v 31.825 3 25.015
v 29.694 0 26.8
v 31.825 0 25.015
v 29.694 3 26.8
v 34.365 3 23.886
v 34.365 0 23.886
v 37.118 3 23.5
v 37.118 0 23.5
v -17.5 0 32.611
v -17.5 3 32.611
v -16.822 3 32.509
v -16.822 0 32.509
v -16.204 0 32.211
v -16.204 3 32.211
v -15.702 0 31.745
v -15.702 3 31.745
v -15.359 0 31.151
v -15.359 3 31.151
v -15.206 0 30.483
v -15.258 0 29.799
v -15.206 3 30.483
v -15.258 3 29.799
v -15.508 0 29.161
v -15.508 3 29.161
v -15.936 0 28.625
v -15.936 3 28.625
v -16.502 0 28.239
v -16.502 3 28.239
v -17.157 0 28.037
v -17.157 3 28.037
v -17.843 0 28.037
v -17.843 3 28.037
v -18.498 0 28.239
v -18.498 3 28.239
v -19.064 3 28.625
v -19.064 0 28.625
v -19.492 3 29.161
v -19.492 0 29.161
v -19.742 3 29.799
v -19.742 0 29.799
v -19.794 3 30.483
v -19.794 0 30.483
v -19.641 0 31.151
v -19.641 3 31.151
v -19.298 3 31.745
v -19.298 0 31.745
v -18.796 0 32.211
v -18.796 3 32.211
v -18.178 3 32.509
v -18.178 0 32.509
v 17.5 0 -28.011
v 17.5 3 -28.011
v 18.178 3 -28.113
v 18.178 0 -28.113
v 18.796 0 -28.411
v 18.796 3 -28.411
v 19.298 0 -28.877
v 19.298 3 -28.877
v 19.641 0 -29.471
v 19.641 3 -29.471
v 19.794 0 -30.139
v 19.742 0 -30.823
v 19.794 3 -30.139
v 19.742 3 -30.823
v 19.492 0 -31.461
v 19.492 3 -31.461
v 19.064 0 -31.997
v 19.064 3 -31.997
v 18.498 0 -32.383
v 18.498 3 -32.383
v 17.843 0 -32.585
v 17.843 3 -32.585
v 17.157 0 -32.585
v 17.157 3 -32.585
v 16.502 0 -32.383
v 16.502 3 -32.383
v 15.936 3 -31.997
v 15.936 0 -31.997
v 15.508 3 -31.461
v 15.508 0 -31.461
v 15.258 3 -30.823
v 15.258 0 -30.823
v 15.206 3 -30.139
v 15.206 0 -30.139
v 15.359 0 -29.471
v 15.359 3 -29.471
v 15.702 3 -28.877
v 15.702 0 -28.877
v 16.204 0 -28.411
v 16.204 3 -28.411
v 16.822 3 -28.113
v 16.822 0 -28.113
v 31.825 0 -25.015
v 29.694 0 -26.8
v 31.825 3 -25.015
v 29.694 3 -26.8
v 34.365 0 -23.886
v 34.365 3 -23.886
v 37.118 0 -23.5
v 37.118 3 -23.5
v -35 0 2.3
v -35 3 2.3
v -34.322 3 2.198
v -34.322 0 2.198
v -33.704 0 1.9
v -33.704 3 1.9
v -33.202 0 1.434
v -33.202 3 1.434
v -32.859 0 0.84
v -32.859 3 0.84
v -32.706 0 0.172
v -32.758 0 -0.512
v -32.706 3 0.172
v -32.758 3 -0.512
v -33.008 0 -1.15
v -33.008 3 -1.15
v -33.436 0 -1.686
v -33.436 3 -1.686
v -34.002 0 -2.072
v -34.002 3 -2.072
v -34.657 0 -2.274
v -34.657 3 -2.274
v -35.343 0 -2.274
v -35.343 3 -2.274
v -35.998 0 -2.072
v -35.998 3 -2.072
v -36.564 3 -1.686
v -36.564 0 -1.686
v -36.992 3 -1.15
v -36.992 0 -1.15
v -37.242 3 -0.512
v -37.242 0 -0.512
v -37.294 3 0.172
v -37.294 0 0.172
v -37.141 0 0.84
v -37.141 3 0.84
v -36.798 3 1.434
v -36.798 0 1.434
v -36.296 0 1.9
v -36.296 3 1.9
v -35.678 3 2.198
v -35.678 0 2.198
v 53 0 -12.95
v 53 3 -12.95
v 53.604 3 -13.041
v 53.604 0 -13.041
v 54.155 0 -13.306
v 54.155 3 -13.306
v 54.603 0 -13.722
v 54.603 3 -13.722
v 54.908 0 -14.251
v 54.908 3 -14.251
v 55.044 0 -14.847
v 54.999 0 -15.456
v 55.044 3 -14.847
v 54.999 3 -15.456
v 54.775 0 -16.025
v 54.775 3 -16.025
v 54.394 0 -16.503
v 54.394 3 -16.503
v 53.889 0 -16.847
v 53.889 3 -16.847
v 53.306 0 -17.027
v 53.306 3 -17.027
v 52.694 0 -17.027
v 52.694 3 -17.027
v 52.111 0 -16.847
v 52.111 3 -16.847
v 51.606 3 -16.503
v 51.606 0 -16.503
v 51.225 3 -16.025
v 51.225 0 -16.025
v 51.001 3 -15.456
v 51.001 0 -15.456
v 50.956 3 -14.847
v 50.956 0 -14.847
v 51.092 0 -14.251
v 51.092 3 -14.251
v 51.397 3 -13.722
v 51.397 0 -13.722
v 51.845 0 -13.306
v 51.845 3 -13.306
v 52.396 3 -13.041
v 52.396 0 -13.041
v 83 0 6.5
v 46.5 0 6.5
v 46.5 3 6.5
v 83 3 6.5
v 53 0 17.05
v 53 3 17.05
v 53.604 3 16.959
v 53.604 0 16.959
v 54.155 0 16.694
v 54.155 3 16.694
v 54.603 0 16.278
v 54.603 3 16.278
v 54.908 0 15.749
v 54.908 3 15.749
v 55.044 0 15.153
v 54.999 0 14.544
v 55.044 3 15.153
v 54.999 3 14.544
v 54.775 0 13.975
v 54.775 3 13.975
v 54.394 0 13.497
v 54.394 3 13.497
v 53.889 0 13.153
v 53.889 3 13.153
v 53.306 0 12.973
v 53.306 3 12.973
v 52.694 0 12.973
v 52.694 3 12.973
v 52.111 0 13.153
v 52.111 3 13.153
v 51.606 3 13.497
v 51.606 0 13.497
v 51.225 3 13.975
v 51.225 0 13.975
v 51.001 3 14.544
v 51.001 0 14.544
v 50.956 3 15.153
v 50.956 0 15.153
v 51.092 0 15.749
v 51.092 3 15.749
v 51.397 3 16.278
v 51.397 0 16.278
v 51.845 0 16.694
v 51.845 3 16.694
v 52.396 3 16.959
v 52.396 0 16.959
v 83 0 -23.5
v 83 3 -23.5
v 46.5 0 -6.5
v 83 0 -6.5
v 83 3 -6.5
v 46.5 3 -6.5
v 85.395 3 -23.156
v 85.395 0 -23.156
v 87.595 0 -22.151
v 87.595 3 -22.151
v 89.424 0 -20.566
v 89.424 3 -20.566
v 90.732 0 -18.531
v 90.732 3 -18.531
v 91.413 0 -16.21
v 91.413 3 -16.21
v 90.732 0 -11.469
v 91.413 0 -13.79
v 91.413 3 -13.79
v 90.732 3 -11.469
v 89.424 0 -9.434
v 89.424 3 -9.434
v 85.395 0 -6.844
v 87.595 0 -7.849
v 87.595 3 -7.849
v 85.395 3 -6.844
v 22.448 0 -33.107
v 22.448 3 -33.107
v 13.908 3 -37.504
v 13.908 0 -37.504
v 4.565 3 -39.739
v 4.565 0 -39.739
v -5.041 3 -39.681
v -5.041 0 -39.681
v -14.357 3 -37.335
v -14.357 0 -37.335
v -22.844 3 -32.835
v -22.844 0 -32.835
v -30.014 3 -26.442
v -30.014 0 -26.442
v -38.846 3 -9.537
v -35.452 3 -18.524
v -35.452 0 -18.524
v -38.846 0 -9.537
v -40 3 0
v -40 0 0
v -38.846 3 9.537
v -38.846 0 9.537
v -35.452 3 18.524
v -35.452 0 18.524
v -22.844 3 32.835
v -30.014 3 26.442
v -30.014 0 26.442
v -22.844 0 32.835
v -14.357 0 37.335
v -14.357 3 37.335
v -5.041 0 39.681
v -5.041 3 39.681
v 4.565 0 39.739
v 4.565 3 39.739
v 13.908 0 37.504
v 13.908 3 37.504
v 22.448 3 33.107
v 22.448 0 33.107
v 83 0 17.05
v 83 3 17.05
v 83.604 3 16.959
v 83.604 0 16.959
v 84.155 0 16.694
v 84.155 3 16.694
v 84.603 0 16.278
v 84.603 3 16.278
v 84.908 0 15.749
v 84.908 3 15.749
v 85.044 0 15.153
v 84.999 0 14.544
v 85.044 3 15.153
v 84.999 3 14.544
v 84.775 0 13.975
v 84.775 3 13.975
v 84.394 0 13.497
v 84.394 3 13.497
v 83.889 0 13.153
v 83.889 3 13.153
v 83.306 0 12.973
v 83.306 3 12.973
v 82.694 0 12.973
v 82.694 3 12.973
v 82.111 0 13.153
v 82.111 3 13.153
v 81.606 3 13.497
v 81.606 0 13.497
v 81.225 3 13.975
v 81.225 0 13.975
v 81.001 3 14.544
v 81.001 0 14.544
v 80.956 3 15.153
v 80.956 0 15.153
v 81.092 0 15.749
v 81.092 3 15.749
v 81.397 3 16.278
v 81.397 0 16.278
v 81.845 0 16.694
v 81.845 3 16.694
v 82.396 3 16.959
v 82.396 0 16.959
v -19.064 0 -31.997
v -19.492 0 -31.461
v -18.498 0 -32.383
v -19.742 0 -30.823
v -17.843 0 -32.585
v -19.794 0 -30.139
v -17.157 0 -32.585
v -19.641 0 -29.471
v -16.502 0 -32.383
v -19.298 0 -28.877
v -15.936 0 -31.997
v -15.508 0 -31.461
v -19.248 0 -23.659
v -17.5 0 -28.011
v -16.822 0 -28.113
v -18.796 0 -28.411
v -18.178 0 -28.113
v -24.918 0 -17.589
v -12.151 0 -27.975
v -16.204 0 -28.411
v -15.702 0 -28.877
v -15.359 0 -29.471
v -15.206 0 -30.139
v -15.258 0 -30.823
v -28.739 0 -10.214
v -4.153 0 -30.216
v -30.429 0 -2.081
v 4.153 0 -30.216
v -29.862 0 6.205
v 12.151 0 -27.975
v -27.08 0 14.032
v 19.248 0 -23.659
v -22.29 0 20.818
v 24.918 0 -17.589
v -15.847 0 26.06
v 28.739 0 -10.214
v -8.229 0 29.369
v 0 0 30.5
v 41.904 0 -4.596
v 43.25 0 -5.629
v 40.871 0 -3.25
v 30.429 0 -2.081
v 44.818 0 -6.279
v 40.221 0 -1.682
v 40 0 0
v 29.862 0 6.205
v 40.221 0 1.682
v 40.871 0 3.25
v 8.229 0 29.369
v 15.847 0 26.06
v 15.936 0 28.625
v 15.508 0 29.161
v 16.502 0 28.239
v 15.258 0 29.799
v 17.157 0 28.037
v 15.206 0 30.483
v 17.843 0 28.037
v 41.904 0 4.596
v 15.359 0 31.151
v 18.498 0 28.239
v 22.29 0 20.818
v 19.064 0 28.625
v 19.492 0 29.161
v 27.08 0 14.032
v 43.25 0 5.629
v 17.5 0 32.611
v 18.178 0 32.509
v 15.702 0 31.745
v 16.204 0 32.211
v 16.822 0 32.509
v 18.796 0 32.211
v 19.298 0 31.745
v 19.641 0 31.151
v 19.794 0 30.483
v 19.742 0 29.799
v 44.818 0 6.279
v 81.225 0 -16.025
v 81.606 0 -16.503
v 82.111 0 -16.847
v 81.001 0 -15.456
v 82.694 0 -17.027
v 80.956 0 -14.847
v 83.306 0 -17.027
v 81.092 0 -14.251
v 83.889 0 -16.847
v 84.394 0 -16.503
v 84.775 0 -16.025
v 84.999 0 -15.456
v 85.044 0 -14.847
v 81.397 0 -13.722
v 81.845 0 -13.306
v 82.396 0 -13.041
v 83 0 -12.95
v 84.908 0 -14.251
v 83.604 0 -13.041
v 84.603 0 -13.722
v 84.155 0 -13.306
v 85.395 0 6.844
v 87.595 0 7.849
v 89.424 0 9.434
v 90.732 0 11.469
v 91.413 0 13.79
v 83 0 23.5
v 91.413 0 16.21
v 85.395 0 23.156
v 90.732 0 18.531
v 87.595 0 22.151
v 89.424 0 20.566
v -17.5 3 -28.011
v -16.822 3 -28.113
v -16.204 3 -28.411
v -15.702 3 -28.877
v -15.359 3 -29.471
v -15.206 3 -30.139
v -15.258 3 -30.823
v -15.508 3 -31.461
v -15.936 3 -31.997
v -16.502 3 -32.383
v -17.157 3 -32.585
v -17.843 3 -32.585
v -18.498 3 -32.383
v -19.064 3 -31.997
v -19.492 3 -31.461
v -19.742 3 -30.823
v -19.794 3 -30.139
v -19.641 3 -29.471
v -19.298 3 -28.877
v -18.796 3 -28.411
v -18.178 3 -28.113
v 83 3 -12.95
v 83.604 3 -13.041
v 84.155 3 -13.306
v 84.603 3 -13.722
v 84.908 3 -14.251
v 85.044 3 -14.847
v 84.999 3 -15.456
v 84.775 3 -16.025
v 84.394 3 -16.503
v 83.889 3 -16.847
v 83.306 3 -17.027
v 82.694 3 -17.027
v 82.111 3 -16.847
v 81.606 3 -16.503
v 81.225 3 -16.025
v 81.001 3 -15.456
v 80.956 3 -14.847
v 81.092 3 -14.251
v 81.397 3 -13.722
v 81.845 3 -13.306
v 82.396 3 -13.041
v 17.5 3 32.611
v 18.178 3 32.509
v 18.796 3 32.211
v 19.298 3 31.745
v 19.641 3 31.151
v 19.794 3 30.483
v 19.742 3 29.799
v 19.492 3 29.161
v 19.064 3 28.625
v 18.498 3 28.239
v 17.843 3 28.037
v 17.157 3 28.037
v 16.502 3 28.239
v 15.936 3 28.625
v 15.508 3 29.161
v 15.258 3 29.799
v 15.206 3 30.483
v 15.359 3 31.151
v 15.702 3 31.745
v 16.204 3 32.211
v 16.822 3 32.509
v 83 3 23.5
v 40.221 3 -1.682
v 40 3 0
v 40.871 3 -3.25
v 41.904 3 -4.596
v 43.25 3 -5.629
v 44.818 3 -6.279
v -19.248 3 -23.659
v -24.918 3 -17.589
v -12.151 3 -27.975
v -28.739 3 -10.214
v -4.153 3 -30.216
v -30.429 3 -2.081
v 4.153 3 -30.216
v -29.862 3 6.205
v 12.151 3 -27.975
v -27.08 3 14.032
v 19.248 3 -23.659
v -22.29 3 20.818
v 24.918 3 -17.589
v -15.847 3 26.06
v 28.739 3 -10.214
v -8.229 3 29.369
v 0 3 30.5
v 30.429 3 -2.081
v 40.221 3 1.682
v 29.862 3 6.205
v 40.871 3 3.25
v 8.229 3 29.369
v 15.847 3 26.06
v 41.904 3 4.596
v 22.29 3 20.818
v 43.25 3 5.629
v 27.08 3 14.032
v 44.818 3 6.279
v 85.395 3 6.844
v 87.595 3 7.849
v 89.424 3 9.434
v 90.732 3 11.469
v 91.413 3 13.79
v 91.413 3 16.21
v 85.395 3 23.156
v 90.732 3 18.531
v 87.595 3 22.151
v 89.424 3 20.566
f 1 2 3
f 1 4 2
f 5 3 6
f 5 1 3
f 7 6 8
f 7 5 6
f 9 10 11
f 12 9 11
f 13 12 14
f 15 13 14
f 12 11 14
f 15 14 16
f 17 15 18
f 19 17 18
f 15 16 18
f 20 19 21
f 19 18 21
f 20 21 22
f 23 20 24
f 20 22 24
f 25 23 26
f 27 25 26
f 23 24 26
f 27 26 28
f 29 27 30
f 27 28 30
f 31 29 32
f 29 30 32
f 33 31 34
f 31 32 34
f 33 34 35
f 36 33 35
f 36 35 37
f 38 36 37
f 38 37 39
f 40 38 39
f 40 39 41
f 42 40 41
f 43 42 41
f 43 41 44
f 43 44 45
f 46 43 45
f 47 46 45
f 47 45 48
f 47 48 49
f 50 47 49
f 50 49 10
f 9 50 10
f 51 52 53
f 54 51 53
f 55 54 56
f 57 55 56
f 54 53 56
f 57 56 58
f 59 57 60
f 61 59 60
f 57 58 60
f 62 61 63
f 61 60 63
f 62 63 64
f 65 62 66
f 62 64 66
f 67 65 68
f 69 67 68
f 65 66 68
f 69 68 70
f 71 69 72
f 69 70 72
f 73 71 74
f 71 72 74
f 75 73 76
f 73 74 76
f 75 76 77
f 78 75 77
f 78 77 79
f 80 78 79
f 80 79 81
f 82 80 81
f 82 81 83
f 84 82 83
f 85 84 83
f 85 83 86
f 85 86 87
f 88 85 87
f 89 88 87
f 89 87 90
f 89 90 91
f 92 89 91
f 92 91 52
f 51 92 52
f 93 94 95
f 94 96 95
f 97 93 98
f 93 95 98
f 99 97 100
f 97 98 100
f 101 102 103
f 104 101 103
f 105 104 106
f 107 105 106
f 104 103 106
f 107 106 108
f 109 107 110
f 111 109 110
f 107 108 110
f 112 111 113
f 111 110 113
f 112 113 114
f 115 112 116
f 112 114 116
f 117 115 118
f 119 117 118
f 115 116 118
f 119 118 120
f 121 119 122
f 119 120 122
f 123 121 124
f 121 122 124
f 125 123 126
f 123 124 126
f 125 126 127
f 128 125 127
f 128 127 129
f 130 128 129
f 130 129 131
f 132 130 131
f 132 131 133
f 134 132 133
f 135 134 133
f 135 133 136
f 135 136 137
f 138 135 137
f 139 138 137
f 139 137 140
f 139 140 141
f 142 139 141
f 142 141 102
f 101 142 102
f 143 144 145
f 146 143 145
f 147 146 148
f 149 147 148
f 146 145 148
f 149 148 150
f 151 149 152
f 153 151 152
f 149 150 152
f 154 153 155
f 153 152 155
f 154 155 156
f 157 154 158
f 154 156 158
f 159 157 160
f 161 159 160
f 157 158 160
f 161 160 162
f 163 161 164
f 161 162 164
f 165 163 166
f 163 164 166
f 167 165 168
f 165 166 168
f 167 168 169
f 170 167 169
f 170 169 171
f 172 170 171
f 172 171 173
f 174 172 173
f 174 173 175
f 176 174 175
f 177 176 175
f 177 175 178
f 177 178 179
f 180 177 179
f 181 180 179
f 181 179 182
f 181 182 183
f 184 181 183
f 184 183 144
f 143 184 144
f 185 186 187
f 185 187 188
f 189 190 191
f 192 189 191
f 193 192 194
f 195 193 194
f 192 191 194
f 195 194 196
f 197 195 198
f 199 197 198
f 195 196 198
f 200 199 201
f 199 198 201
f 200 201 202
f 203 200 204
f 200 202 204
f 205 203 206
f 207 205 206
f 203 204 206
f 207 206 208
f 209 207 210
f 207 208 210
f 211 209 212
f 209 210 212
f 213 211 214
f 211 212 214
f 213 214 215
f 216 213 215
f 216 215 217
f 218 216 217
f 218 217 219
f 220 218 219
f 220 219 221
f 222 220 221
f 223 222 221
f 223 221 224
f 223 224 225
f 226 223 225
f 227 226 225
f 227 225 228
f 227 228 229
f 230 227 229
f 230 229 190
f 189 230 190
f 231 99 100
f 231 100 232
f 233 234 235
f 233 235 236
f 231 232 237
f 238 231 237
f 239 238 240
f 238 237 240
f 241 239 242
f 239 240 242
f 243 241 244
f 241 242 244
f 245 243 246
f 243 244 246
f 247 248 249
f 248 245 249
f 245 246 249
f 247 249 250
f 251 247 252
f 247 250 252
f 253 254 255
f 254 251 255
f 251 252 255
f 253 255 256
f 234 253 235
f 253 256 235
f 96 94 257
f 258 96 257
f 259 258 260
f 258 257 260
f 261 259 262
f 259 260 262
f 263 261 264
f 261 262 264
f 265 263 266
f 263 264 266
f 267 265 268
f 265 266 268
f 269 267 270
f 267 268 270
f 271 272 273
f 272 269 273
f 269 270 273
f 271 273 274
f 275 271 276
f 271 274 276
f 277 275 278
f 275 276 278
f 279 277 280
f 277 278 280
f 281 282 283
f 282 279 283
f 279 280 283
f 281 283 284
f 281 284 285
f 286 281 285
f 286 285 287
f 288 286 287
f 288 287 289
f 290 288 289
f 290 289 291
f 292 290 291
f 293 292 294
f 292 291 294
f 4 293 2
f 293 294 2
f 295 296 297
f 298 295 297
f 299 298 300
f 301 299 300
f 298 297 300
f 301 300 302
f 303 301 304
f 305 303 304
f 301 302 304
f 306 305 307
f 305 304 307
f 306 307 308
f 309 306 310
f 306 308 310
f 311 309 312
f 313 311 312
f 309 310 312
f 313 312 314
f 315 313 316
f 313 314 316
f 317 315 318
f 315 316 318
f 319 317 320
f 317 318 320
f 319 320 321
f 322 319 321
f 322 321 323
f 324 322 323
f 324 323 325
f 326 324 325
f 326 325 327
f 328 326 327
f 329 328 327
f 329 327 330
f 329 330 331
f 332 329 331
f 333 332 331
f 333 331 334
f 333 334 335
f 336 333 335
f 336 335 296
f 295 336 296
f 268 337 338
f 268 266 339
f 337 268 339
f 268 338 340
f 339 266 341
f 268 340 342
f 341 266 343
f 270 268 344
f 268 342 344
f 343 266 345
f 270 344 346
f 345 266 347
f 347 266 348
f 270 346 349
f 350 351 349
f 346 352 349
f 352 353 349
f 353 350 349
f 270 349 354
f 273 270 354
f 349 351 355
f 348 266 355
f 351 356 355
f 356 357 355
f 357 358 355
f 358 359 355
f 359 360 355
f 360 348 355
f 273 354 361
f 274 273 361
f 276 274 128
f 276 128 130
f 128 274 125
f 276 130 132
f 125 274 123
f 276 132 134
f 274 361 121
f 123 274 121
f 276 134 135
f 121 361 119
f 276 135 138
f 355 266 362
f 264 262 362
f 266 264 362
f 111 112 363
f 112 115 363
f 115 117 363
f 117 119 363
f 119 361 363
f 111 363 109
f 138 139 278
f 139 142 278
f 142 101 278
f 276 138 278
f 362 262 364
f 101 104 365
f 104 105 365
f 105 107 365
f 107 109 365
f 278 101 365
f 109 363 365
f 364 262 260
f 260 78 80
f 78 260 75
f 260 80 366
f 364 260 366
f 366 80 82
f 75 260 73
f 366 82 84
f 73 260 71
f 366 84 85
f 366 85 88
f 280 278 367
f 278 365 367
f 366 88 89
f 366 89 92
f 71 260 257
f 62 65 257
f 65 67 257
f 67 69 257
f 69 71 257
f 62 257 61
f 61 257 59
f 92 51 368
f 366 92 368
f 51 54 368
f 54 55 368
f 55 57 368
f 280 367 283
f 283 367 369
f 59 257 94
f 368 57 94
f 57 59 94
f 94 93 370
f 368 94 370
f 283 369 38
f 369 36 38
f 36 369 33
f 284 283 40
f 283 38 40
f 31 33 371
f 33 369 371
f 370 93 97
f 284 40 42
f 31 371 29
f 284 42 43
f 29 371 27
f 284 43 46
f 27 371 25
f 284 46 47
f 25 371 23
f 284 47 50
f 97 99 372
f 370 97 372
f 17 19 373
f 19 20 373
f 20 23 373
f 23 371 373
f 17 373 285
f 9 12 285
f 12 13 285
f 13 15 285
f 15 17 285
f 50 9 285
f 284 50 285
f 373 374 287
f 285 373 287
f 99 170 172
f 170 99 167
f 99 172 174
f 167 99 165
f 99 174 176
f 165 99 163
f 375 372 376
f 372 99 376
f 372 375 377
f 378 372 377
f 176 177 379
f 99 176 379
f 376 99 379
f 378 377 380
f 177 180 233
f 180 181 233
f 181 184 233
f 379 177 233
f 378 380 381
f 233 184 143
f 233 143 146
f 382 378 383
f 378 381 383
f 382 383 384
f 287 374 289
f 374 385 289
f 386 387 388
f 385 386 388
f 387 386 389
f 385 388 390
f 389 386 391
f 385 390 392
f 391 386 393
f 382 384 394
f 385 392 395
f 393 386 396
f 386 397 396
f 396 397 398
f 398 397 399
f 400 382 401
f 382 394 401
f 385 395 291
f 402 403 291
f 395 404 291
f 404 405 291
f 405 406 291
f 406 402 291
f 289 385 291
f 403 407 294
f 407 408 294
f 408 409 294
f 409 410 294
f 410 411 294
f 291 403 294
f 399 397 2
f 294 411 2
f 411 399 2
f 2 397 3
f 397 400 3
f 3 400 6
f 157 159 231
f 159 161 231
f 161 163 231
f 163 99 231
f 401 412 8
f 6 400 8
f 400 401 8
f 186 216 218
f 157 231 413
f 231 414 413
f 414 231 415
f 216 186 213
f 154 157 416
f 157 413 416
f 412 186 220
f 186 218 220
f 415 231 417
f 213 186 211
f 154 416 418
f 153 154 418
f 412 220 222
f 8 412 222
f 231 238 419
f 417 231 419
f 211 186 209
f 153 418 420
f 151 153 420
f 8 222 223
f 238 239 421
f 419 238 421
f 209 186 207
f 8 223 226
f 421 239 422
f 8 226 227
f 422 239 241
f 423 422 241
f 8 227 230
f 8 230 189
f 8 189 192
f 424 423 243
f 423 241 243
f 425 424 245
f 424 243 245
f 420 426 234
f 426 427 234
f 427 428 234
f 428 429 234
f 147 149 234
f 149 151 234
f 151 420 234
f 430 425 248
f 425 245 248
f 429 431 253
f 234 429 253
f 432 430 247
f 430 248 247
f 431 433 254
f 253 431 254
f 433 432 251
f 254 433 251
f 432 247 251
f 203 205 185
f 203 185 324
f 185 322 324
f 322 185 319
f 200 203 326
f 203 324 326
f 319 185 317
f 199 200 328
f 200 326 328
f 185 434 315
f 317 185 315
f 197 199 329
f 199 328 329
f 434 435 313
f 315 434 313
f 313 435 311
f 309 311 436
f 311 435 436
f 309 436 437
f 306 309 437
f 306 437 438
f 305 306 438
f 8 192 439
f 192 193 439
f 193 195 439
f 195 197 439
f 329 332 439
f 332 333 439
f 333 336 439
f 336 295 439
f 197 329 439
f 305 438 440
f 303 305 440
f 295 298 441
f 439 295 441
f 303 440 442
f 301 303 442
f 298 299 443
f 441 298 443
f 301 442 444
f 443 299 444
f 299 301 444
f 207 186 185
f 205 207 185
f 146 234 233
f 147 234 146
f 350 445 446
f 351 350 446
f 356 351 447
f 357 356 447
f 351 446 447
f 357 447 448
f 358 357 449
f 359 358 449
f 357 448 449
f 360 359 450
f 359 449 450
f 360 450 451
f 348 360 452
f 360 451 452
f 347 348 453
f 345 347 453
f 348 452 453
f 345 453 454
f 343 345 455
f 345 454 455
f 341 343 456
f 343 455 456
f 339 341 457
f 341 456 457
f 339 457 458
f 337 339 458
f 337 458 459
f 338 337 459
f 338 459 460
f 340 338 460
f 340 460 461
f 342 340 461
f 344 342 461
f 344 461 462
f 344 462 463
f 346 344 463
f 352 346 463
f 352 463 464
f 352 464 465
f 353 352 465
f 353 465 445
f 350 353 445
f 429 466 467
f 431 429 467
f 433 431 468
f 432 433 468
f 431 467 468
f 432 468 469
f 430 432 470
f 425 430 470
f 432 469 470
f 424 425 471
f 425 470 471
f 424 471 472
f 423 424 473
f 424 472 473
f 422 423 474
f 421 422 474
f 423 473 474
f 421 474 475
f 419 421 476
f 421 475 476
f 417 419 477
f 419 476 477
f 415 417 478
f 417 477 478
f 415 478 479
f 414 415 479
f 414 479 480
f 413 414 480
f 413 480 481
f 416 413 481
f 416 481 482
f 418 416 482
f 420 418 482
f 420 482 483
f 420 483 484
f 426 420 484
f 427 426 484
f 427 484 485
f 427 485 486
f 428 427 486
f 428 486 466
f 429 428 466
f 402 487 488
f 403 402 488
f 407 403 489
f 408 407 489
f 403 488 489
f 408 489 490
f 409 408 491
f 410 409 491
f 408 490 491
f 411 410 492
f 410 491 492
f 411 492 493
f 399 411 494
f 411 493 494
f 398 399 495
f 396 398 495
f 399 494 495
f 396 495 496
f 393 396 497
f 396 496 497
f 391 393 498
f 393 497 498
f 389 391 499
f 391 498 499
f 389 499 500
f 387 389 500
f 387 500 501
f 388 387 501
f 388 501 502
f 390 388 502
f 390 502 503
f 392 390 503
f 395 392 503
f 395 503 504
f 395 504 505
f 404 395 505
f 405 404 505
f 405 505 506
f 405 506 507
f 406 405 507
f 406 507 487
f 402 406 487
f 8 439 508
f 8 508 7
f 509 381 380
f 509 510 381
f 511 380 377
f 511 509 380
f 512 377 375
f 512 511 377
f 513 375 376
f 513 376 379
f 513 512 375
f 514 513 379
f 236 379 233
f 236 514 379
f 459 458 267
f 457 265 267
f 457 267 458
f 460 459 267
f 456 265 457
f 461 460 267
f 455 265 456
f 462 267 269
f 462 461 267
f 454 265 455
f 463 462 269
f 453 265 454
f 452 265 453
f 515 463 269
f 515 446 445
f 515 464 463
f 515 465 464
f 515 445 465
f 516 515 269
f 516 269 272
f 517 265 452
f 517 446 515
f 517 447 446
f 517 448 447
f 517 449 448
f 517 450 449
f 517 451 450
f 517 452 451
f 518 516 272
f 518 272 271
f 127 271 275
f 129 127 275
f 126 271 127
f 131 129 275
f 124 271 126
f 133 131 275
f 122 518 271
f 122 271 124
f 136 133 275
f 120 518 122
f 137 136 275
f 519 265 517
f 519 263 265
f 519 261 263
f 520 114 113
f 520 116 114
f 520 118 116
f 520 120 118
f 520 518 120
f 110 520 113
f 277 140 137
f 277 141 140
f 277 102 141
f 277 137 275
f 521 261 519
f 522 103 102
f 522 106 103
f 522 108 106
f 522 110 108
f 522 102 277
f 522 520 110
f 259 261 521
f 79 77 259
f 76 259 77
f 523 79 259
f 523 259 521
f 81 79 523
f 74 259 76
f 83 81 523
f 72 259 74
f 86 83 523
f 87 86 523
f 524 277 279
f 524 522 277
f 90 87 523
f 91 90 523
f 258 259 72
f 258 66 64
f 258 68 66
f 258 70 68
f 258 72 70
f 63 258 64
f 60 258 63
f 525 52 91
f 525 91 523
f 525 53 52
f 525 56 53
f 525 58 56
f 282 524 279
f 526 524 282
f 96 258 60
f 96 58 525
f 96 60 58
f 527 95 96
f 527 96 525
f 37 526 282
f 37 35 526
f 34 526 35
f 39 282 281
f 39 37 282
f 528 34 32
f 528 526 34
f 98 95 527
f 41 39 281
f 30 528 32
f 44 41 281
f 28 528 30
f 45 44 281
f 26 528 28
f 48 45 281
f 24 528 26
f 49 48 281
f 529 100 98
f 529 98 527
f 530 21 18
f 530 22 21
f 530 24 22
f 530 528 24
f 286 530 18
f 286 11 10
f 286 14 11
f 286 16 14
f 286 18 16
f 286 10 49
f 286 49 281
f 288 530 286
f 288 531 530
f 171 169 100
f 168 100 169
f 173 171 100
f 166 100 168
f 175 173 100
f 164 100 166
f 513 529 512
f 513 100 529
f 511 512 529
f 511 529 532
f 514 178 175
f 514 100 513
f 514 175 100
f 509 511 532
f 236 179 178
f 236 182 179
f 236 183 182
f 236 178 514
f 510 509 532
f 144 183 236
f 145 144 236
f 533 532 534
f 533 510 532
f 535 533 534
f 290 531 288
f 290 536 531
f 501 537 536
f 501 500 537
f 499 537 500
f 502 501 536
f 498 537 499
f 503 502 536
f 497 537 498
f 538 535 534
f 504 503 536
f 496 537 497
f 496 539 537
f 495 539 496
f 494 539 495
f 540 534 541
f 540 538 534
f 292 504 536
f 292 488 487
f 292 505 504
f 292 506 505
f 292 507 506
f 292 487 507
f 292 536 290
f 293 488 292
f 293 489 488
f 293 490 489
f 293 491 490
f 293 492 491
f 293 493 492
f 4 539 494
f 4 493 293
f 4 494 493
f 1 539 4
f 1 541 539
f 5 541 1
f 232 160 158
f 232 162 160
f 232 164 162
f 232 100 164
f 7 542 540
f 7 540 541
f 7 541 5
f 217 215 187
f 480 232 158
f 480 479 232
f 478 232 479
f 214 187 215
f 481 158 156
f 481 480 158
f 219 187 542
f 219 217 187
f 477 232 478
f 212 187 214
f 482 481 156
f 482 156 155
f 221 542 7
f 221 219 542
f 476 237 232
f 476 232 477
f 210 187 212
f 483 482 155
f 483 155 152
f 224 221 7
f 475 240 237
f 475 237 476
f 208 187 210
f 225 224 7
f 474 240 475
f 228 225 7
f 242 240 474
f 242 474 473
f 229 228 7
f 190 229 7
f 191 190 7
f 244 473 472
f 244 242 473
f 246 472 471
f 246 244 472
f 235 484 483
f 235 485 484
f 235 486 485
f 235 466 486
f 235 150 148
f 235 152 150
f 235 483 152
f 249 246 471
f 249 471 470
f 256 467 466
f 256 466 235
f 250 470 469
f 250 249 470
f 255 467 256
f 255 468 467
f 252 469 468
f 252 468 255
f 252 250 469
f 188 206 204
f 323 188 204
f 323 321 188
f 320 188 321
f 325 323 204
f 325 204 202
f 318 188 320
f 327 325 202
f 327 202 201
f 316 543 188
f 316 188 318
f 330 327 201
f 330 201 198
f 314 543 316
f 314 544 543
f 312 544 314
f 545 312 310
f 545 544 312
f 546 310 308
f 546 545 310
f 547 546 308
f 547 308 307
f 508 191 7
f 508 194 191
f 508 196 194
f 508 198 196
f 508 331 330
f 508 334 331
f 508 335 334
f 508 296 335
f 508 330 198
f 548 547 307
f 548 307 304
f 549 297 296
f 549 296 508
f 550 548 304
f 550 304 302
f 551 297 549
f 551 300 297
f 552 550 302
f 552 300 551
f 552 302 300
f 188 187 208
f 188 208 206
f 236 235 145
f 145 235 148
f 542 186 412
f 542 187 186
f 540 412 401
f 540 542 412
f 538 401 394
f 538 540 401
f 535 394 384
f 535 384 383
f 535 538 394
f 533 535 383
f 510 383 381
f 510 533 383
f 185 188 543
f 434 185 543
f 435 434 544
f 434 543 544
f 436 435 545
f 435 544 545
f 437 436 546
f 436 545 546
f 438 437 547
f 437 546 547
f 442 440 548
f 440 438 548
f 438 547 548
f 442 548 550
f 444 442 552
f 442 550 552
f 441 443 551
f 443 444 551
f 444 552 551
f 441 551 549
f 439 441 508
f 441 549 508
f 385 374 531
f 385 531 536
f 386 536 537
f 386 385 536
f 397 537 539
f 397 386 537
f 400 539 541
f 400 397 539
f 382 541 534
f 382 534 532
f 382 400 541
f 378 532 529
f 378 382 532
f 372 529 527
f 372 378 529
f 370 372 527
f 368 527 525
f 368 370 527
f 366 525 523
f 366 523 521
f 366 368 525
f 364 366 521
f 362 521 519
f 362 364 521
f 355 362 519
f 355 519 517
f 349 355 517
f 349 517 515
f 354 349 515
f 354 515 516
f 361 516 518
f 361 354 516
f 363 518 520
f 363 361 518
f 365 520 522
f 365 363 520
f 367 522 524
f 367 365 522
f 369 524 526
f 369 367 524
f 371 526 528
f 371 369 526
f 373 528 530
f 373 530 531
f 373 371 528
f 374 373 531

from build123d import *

# Parameters (mm, degrees)
SKETCH1_R           = 40
SKETCH1_R_2         = 30.5
BOSS_EXTRUDE1_DEPTH = 3
BOSS_EXTRUDE2_START = -3
BOSS_EXTRUDE2_DEPTH = 3
SKETCH3_R           = 2.05
CUT_EXTRUDE1_DEPTH  = 108.745069493
SKETCH4_R           = 2.3
CUT_EXTRUDE2_DEPTH  = 108.745069493
CUT_EXTRUDE3_DEPTH  = 108.745069493
FILLET1_R           = 10
FILLET2_R           = 6.5


with BuildPart() as part:
    # Sketch1 → Boss-Extrude1 (new body)
    with BuildSketch(Plane(origin=(0, 0, 0), x_dir=(1, 0, 0), z_dir=(0, 1, 0))):
        with Locations(Location((0, 0, 0), (0, 0, 270))):
            Circle(SKETCH1_R)
        with Locations(Location((0, 0, 0), (0, 0, 270))):
            Circle(SKETCH1_R_2, mode=Mode.SUBTRACT)
    extrude(amount=BOSS_EXTRUDE1_DEPTH)

    # Sketch2 → Boss-Extrude2 (add)
    with BuildSketch(Plane(origin=(0, 3, 0), x_dir=(1, 0, 0), z_dir=(0, 1, 0)).offset(BOSS_EXTRUDE2_START)):
        with BuildLine():
            Line((100, 6.5), (39.468341744, 6.5))
            ThreePointArc((39.468341744, 6.5), (36.910699238, 15.414288235), (32.368966619, 23.5))
            Line((32.368966619, 23.5), (100, 23.5))
            Line((100, 23.5), (100, 6.5))
        make_face()
        with BuildLine():
            Line((39.468341744, -6.5), (100, -6.5))
            Line((100, -6.5), (100, -23.5))
            Line((100, -23.5), (32.368966619, -23.5))
            ThreePointArc((32.368966619, -23.5), (36.910699238, -15.414288235), (39.468341744, -6.5))
        make_face()
    extrude(amount=BOSS_EXTRUDE2_DEPTH)

    # Sketch3 → Cut-Extrude1 (cut, through all)
    with BuildSketch(Plane(origin=(0, 3, 0), x_dir=(1, 0, 0), z_dir=(0, 1, 0))):
        with Locations(Location((53, 15, 0), (0, 0, 270))):
            Circle(SKETCH3_R)
        with Locations(Location((83, 15, 0), (0, 0, 270))):
            Circle(SKETCH3_R)
        with Locations(Location((53, -15, 0), (0, 0, 270))):
            Circle(SKETCH3_R)
        with Locations(Location((83, -15, 0), (0, 0, 270))):
            Circle(SKETCH3_R)
    extrude(amount=-CUT_EXTRUDE1_DEPTH, mode=Mode.SUBTRACT)

    # Sketch4 → Cut-Extrude2 (cut, through all)
    with BuildSketch(Plane(origin=(0, 3, 0), x_dir=(1, 0, 0), z_dir=(0, 1, 0))):
        with Locations(Location((-17.5, 30.310889132, 0), (0, 0, 270))):
            Circle(SKETCH4_R)
        with Locations(Location((17.5, 30.310889132, 0), (0, 0, 270))):
            Circle(SKETCH4_R)
        with Locations(Location((17.5, -30.310889132, 0), (0, 0, 270))):
            Circle(SKETCH4_R)
        with Locations(Location((-17.5, -30.310889132, 0), (0, 0, 270))):
            Circle(SKETCH4_R)
        with Locations(Location((-35, 0, 0), (0, 0, 270))):
            Circle(SKETCH4_R)
    extrude(amount=-CUT_EXTRUDE2_DEPTH, mode=Mode.SUBTRACT)

    # Sketch6 → Cut-Extrude3 (cut, through all)
    with BuildSketch(Plane(origin=(0, 3, 0), x_dir=(1, 0, 0), z_dir=(0, 1, 0))):
        with BuildLine():
            Line((100, 23.5), (83, 23.5))
            ThreePointArc((83, 23.5), (91.5, 15), (83, 6.5))
            Line((83, 6.5), (100, 6.5))
            Line((100, 6.5), (100, 23.5))
        make_face()
        with BuildLine():
            Line((100, -6.5), (83, -6.5))
            ThreePointArc((83, -6.5), (91.5, -15), (83, -23.5))
            Line((83, -23.5), (100, -23.5))
            Line((100, -23.5), (100, -6.5))
        make_face()
    extrude(amount=-CUT_EXTRUDE3_DEPTH, mode=Mode.SUBTRACT)

    # Fillet1
    fillet1_edges = [part.edges().sort_by_distance(p)[0] for p in [
        (32.368966619, 1.5, -23.5),
        (32.368966619, 1.5, 23.5),
    ]]
    fillet(fillet1_edges, radius=FILLET1_R)

    # Fillet2
    fillet2_edges = [part.edges().sort_by_distance(p)[0] for p in [
        (39.468341744, 1.5, 6.5),
        (39.468341744, 1.5, -6.5),
    ]]
    fillet(fillet2_edges, radius=FILLET2_R - 0.0001)  # a hair under: the kernel refuses the full size


solid = part.part
